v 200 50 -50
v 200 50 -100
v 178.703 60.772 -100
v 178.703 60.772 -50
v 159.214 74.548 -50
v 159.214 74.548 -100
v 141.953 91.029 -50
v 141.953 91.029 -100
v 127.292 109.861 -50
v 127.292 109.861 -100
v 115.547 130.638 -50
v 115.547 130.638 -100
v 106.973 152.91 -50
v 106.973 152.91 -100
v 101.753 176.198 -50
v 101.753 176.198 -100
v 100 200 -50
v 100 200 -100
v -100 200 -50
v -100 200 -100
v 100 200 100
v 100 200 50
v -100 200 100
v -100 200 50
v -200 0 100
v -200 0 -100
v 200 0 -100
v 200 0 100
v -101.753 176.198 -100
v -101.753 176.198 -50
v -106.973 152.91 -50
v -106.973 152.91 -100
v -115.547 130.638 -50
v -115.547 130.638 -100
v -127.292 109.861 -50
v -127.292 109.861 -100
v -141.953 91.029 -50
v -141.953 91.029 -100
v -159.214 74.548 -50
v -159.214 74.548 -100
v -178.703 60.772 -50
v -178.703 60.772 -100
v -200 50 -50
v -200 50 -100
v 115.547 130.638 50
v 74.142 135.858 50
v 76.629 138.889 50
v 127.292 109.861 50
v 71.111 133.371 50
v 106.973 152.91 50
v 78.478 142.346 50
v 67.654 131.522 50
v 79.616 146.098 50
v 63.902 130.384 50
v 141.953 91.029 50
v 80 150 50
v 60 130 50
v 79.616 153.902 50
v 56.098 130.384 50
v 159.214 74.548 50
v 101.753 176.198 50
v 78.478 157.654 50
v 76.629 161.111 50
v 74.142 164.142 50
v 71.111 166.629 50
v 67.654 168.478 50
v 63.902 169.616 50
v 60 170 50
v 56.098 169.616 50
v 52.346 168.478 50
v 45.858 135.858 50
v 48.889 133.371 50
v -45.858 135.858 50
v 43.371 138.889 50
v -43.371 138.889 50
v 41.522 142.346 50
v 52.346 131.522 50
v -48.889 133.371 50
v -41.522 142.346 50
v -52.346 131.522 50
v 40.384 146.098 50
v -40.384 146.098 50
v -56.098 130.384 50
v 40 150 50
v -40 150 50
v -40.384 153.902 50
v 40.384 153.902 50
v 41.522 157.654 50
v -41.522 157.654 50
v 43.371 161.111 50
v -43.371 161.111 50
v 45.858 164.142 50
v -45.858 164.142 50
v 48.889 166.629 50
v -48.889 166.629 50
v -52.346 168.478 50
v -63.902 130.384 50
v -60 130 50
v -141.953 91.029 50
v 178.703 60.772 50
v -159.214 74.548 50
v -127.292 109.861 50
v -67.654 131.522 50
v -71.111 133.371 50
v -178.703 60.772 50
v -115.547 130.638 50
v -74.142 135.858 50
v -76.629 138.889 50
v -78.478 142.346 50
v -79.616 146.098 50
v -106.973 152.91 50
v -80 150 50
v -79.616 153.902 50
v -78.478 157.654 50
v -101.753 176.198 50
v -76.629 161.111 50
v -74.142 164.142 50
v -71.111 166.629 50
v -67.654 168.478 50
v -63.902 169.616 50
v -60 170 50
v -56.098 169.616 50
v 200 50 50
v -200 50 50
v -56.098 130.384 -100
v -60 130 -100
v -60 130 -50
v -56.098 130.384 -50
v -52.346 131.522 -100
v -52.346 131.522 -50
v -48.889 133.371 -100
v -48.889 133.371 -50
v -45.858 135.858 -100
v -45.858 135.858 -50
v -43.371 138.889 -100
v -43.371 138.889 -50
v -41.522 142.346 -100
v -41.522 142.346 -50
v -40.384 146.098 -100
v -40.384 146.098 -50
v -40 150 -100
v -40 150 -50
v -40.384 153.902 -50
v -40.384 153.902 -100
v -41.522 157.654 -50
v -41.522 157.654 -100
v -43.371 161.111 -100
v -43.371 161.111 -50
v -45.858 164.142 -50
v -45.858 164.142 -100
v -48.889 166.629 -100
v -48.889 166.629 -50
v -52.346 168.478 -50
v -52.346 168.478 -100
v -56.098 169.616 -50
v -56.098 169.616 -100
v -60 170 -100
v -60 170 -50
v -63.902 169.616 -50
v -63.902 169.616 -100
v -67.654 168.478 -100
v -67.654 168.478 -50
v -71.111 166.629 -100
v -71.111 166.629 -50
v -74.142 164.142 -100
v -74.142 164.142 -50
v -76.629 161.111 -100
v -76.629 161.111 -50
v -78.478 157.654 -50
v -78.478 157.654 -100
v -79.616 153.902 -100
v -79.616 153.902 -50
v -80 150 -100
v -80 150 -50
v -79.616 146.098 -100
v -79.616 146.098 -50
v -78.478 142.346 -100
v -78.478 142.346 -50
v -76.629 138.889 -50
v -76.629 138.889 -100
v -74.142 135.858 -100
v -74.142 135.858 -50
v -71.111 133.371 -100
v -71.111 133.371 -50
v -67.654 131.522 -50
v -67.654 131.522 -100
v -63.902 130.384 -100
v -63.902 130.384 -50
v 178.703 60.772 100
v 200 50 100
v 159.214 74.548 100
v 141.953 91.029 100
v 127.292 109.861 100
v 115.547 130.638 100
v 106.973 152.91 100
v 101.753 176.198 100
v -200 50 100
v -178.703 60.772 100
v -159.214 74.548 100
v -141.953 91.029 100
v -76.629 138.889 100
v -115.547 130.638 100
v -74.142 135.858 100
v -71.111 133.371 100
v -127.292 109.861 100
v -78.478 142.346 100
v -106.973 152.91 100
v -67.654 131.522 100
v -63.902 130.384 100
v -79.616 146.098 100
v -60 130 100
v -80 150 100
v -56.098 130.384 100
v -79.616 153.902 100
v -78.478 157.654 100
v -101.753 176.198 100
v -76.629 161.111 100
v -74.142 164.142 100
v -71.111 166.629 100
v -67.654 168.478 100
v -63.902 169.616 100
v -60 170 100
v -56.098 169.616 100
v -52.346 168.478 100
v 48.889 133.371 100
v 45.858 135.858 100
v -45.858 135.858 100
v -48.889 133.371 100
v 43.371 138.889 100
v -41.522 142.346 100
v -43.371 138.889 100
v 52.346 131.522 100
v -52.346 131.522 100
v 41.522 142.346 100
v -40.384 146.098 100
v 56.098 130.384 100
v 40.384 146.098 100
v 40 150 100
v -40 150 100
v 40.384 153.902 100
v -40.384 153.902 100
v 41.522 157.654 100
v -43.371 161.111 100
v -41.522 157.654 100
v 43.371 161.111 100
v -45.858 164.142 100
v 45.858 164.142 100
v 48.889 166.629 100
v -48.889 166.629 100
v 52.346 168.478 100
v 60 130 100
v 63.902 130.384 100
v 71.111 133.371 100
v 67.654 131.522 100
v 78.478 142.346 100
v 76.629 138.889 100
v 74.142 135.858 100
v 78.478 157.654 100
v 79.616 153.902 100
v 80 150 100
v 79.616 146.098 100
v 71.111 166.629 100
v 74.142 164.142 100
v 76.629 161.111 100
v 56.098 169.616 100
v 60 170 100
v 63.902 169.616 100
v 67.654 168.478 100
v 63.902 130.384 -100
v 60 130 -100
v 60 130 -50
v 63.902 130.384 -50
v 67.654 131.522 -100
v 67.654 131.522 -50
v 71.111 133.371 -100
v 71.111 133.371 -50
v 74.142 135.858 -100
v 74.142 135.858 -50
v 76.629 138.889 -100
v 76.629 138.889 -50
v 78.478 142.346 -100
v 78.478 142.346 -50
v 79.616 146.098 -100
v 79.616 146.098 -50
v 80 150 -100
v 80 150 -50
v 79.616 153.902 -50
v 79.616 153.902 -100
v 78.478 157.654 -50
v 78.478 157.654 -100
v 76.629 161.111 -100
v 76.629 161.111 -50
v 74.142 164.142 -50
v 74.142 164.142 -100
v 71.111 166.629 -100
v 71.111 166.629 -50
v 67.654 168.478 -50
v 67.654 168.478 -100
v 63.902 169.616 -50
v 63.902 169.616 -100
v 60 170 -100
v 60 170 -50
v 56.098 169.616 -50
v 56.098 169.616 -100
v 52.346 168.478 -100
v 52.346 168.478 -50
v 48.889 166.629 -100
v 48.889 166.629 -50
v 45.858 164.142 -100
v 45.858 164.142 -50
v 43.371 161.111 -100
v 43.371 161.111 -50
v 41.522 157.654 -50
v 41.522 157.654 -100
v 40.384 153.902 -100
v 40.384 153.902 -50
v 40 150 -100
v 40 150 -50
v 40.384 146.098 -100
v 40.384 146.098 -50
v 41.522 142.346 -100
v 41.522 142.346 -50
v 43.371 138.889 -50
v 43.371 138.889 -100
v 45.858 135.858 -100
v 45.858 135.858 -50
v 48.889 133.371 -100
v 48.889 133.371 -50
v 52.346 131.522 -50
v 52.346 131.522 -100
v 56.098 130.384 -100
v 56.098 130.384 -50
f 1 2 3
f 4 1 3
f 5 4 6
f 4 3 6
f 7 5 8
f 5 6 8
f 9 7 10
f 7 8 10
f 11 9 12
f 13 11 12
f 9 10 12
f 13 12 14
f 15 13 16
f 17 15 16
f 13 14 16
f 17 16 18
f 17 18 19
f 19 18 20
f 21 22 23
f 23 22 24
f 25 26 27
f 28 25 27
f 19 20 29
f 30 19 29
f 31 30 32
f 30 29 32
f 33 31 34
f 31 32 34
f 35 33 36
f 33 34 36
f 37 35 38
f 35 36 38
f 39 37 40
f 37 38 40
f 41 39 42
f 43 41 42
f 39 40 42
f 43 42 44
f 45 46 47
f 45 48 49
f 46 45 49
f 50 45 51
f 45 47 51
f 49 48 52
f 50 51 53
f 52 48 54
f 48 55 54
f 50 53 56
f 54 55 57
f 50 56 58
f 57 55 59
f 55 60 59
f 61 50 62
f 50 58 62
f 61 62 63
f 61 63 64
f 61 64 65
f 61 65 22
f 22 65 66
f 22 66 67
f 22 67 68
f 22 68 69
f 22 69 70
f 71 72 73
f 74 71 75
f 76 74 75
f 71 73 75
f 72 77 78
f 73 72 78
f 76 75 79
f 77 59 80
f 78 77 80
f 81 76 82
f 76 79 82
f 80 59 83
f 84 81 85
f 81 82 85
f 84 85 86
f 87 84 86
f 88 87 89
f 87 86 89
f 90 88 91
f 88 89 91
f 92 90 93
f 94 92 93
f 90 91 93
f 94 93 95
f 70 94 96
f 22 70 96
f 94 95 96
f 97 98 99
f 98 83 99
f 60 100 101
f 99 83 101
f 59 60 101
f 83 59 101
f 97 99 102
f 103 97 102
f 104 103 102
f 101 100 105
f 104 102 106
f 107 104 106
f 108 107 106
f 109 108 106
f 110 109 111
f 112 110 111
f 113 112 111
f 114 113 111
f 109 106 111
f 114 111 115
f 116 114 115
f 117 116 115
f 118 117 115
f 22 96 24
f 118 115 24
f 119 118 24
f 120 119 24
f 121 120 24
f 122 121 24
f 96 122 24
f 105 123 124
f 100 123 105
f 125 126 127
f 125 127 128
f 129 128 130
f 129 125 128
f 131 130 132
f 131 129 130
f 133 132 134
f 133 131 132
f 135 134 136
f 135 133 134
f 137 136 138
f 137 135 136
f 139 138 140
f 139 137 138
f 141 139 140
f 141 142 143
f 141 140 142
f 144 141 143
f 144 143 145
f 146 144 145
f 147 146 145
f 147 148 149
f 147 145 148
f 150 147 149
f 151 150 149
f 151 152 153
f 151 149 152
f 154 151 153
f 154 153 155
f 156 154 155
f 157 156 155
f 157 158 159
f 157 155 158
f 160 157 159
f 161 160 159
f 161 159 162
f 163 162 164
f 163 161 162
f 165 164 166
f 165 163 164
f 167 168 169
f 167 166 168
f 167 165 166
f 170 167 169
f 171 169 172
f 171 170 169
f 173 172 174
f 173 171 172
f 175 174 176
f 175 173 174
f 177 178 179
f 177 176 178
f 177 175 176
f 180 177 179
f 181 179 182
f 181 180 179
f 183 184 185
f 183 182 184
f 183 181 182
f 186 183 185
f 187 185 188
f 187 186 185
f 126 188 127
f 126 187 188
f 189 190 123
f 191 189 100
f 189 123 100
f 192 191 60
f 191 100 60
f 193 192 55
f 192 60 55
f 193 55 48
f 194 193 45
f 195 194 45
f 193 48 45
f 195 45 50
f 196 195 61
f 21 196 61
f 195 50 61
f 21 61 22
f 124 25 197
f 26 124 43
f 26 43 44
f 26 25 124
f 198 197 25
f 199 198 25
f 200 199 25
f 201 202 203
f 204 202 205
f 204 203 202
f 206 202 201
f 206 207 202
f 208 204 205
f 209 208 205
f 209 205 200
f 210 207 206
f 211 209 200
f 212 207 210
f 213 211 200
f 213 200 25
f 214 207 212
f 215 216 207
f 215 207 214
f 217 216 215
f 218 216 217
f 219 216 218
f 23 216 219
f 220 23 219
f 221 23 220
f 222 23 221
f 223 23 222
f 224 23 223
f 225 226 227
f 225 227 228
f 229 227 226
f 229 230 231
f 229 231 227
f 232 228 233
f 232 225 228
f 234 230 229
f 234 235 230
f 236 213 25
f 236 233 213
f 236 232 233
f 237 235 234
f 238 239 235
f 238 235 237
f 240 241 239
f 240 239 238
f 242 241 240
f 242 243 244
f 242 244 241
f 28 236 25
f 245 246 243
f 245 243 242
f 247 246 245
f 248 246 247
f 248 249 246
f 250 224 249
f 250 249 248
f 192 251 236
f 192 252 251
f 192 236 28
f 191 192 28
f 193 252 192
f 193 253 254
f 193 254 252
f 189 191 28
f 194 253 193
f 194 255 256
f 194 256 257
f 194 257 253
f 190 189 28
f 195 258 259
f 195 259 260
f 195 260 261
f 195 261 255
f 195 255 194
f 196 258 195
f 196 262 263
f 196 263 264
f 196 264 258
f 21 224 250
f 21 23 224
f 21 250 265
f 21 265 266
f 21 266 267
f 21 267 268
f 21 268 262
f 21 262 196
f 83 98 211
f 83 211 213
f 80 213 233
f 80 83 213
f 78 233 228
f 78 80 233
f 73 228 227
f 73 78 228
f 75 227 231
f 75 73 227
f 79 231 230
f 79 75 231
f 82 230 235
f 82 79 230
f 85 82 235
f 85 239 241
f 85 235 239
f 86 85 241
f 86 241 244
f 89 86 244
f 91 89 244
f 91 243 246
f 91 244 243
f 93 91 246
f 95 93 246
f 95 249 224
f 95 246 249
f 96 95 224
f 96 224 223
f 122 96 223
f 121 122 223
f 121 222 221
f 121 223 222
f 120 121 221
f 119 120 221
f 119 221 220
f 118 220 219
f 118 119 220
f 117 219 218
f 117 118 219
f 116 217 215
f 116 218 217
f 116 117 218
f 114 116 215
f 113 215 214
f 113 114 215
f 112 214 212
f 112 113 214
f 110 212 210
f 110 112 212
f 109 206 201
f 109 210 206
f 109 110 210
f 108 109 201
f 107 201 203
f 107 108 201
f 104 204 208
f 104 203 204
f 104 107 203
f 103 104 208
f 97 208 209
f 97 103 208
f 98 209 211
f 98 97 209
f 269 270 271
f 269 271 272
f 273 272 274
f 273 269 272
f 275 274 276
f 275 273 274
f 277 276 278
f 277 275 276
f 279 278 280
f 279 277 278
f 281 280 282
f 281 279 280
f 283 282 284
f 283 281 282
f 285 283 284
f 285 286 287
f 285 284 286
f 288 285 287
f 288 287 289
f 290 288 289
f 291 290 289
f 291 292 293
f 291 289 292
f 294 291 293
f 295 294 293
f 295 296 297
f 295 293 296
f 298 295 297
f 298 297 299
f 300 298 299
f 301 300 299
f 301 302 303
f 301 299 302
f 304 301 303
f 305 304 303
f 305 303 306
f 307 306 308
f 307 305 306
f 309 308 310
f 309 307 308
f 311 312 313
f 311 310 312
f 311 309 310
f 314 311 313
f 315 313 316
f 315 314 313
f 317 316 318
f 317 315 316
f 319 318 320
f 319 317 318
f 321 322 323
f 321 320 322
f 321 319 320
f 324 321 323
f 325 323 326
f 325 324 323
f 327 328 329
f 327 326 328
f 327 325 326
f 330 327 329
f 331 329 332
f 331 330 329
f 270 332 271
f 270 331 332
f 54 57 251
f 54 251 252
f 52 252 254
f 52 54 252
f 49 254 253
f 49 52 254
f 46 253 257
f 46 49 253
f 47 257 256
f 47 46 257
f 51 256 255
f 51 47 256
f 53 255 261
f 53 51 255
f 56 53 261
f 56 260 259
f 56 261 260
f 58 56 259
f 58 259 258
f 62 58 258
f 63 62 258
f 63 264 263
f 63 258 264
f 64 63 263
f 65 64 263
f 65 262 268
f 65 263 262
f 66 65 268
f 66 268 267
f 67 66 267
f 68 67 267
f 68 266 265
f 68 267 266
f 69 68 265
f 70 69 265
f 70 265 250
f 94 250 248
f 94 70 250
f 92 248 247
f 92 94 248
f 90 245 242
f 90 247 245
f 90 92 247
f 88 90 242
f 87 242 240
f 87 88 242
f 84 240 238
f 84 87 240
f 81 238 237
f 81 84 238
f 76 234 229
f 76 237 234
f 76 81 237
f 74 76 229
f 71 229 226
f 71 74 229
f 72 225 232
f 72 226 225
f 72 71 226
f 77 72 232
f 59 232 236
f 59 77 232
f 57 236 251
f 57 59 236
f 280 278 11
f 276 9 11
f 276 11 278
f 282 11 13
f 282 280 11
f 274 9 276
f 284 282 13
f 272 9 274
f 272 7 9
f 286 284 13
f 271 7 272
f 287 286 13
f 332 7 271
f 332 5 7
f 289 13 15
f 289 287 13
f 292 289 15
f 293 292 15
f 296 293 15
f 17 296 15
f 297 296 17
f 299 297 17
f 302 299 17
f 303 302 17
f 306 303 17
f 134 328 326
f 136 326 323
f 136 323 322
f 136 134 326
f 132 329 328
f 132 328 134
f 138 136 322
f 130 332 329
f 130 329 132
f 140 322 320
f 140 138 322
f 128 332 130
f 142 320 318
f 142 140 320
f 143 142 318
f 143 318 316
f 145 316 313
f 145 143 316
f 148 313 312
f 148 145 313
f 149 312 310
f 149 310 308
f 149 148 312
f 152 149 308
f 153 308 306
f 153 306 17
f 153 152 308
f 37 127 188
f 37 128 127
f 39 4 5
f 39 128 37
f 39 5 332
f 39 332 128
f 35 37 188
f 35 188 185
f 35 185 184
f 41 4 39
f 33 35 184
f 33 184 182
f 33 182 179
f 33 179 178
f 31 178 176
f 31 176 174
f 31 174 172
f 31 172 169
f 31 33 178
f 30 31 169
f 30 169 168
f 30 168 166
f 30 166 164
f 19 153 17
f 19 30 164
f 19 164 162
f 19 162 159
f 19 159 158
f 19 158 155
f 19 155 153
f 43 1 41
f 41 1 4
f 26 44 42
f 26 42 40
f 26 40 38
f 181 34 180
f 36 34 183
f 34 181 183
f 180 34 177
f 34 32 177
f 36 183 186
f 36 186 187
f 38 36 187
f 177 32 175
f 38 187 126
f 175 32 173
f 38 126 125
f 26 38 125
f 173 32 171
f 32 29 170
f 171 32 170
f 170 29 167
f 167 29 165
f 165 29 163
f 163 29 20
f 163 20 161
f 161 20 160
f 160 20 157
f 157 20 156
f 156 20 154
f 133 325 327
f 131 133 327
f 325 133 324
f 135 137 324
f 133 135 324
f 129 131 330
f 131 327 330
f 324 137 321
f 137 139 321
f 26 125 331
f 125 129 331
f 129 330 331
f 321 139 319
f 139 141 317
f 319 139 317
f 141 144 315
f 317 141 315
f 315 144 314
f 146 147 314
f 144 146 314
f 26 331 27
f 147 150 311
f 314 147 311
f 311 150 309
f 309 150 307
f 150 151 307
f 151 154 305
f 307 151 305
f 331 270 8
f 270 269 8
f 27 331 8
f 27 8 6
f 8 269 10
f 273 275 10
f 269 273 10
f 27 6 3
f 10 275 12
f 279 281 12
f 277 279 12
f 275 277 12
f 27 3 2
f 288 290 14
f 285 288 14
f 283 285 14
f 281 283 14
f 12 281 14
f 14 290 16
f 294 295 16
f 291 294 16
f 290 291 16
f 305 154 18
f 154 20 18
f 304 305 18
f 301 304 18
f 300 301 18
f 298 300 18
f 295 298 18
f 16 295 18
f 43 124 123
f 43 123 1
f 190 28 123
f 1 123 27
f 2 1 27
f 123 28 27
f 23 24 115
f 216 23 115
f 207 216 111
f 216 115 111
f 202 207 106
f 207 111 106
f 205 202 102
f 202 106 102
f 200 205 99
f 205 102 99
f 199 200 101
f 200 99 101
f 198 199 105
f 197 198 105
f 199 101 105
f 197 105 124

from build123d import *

# Parameters (mm, degrees)
SKETCH1_W                = 400
SKETCH1_H                = 200
BOSS_EXTRUDE1_DEPTH      = 50
BOSS_EXTRUDE2_DEPTH      = 100
BOSS_EXTRUDE2_DEPTH_BACK = 100
CUT_EXTRUDE1_DEPTH       = 200
CUT_EXTRUDE1_DEPTH_BACK  = 200
SKETCH3_W                = 100
SKETCH3_H                = 185.844044806
CUT_EXTRUDE2_DEPTH       = 200
CUT_EXTRUDE2_DEPTH_BACK  = 200
SKETCH4_R                = 20


with BuildPart() as part:
    # Sketch1 → Boss-Extrude1 (new body)
    with BuildSketch(Plane(origin=(0, 0, 0), x_dir=(1, 0, 0), z_dir=(0, 1, 0))):
        Rectangle(SKETCH1_W, SKETCH1_H)
    extrude(amount=BOSS_EXTRUDE1_DEPTH)

    # Sketch2 → Boss-Extrude2 (add, two sides: drawn at the far end of the back side and taken through both)
    with BuildSketch(Plane.XY.offset(-BOSS_EXTRUDE2_DEPTH_BACK)):
        with BuildLine():
            Line((-100, 50), (100, 50))
            Line((100, 50), (200, 50))
            ThreePointArc((200, 50), (127.29182717, 109.861218113), (100, 200))
            Line((100, 200), (-100, 200))
            ThreePointArc((-100, 200), (-127.29182717, 109.861218113), (-200, 50))
            Line((-200, 50), (-100, 50))
        make_face()
    extrude(amount=BOSS_EXTRUDE2_DEPTH + BOSS_EXTRUDE2_DEPTH_BACK)

    # Sketch3 → Cut-Extrude1 (cut, two sides: drawn at the far end of the back side and taken through both)
    with BuildSketch(Plane(origin=(0, 0, 0), x_dir=(0, 0, -1), z_dir=(1, 0, 0)).offset(-CUT_EXTRUDE1_DEPTH_BACK)):
        with Locations((0, 142.922022403)):
            Rectangle(SKETCH3_W, SKETCH3_H)
    extrude(amount=CUT_EXTRUDE1_DEPTH + CUT_EXTRUDE1_DEPTH_BACK, mode=Mode.SUBTRACT)

    # Sketch4 → Cut-Extrude2 (cut, two sides: drawn at the far end of the back side and taken through both)
    with BuildSketch(Plane.XY.offset(-CUT_EXTRUDE2_DEPTH_BACK)):
        with Locations(Location((-60, 150, 0), (0, 0, 270))):
            Circle(SKETCH4_R)
        with Locations(Location((60, 150, 0), (0, 0, 270))):
            Circle(SKETCH4_R)
    extrude(amount=CUT_EXTRUDE2_DEPTH + CUT_EXTRUDE2_DEPTH_BACK, mode=Mode.SUBTRACT)


solid = part.part
